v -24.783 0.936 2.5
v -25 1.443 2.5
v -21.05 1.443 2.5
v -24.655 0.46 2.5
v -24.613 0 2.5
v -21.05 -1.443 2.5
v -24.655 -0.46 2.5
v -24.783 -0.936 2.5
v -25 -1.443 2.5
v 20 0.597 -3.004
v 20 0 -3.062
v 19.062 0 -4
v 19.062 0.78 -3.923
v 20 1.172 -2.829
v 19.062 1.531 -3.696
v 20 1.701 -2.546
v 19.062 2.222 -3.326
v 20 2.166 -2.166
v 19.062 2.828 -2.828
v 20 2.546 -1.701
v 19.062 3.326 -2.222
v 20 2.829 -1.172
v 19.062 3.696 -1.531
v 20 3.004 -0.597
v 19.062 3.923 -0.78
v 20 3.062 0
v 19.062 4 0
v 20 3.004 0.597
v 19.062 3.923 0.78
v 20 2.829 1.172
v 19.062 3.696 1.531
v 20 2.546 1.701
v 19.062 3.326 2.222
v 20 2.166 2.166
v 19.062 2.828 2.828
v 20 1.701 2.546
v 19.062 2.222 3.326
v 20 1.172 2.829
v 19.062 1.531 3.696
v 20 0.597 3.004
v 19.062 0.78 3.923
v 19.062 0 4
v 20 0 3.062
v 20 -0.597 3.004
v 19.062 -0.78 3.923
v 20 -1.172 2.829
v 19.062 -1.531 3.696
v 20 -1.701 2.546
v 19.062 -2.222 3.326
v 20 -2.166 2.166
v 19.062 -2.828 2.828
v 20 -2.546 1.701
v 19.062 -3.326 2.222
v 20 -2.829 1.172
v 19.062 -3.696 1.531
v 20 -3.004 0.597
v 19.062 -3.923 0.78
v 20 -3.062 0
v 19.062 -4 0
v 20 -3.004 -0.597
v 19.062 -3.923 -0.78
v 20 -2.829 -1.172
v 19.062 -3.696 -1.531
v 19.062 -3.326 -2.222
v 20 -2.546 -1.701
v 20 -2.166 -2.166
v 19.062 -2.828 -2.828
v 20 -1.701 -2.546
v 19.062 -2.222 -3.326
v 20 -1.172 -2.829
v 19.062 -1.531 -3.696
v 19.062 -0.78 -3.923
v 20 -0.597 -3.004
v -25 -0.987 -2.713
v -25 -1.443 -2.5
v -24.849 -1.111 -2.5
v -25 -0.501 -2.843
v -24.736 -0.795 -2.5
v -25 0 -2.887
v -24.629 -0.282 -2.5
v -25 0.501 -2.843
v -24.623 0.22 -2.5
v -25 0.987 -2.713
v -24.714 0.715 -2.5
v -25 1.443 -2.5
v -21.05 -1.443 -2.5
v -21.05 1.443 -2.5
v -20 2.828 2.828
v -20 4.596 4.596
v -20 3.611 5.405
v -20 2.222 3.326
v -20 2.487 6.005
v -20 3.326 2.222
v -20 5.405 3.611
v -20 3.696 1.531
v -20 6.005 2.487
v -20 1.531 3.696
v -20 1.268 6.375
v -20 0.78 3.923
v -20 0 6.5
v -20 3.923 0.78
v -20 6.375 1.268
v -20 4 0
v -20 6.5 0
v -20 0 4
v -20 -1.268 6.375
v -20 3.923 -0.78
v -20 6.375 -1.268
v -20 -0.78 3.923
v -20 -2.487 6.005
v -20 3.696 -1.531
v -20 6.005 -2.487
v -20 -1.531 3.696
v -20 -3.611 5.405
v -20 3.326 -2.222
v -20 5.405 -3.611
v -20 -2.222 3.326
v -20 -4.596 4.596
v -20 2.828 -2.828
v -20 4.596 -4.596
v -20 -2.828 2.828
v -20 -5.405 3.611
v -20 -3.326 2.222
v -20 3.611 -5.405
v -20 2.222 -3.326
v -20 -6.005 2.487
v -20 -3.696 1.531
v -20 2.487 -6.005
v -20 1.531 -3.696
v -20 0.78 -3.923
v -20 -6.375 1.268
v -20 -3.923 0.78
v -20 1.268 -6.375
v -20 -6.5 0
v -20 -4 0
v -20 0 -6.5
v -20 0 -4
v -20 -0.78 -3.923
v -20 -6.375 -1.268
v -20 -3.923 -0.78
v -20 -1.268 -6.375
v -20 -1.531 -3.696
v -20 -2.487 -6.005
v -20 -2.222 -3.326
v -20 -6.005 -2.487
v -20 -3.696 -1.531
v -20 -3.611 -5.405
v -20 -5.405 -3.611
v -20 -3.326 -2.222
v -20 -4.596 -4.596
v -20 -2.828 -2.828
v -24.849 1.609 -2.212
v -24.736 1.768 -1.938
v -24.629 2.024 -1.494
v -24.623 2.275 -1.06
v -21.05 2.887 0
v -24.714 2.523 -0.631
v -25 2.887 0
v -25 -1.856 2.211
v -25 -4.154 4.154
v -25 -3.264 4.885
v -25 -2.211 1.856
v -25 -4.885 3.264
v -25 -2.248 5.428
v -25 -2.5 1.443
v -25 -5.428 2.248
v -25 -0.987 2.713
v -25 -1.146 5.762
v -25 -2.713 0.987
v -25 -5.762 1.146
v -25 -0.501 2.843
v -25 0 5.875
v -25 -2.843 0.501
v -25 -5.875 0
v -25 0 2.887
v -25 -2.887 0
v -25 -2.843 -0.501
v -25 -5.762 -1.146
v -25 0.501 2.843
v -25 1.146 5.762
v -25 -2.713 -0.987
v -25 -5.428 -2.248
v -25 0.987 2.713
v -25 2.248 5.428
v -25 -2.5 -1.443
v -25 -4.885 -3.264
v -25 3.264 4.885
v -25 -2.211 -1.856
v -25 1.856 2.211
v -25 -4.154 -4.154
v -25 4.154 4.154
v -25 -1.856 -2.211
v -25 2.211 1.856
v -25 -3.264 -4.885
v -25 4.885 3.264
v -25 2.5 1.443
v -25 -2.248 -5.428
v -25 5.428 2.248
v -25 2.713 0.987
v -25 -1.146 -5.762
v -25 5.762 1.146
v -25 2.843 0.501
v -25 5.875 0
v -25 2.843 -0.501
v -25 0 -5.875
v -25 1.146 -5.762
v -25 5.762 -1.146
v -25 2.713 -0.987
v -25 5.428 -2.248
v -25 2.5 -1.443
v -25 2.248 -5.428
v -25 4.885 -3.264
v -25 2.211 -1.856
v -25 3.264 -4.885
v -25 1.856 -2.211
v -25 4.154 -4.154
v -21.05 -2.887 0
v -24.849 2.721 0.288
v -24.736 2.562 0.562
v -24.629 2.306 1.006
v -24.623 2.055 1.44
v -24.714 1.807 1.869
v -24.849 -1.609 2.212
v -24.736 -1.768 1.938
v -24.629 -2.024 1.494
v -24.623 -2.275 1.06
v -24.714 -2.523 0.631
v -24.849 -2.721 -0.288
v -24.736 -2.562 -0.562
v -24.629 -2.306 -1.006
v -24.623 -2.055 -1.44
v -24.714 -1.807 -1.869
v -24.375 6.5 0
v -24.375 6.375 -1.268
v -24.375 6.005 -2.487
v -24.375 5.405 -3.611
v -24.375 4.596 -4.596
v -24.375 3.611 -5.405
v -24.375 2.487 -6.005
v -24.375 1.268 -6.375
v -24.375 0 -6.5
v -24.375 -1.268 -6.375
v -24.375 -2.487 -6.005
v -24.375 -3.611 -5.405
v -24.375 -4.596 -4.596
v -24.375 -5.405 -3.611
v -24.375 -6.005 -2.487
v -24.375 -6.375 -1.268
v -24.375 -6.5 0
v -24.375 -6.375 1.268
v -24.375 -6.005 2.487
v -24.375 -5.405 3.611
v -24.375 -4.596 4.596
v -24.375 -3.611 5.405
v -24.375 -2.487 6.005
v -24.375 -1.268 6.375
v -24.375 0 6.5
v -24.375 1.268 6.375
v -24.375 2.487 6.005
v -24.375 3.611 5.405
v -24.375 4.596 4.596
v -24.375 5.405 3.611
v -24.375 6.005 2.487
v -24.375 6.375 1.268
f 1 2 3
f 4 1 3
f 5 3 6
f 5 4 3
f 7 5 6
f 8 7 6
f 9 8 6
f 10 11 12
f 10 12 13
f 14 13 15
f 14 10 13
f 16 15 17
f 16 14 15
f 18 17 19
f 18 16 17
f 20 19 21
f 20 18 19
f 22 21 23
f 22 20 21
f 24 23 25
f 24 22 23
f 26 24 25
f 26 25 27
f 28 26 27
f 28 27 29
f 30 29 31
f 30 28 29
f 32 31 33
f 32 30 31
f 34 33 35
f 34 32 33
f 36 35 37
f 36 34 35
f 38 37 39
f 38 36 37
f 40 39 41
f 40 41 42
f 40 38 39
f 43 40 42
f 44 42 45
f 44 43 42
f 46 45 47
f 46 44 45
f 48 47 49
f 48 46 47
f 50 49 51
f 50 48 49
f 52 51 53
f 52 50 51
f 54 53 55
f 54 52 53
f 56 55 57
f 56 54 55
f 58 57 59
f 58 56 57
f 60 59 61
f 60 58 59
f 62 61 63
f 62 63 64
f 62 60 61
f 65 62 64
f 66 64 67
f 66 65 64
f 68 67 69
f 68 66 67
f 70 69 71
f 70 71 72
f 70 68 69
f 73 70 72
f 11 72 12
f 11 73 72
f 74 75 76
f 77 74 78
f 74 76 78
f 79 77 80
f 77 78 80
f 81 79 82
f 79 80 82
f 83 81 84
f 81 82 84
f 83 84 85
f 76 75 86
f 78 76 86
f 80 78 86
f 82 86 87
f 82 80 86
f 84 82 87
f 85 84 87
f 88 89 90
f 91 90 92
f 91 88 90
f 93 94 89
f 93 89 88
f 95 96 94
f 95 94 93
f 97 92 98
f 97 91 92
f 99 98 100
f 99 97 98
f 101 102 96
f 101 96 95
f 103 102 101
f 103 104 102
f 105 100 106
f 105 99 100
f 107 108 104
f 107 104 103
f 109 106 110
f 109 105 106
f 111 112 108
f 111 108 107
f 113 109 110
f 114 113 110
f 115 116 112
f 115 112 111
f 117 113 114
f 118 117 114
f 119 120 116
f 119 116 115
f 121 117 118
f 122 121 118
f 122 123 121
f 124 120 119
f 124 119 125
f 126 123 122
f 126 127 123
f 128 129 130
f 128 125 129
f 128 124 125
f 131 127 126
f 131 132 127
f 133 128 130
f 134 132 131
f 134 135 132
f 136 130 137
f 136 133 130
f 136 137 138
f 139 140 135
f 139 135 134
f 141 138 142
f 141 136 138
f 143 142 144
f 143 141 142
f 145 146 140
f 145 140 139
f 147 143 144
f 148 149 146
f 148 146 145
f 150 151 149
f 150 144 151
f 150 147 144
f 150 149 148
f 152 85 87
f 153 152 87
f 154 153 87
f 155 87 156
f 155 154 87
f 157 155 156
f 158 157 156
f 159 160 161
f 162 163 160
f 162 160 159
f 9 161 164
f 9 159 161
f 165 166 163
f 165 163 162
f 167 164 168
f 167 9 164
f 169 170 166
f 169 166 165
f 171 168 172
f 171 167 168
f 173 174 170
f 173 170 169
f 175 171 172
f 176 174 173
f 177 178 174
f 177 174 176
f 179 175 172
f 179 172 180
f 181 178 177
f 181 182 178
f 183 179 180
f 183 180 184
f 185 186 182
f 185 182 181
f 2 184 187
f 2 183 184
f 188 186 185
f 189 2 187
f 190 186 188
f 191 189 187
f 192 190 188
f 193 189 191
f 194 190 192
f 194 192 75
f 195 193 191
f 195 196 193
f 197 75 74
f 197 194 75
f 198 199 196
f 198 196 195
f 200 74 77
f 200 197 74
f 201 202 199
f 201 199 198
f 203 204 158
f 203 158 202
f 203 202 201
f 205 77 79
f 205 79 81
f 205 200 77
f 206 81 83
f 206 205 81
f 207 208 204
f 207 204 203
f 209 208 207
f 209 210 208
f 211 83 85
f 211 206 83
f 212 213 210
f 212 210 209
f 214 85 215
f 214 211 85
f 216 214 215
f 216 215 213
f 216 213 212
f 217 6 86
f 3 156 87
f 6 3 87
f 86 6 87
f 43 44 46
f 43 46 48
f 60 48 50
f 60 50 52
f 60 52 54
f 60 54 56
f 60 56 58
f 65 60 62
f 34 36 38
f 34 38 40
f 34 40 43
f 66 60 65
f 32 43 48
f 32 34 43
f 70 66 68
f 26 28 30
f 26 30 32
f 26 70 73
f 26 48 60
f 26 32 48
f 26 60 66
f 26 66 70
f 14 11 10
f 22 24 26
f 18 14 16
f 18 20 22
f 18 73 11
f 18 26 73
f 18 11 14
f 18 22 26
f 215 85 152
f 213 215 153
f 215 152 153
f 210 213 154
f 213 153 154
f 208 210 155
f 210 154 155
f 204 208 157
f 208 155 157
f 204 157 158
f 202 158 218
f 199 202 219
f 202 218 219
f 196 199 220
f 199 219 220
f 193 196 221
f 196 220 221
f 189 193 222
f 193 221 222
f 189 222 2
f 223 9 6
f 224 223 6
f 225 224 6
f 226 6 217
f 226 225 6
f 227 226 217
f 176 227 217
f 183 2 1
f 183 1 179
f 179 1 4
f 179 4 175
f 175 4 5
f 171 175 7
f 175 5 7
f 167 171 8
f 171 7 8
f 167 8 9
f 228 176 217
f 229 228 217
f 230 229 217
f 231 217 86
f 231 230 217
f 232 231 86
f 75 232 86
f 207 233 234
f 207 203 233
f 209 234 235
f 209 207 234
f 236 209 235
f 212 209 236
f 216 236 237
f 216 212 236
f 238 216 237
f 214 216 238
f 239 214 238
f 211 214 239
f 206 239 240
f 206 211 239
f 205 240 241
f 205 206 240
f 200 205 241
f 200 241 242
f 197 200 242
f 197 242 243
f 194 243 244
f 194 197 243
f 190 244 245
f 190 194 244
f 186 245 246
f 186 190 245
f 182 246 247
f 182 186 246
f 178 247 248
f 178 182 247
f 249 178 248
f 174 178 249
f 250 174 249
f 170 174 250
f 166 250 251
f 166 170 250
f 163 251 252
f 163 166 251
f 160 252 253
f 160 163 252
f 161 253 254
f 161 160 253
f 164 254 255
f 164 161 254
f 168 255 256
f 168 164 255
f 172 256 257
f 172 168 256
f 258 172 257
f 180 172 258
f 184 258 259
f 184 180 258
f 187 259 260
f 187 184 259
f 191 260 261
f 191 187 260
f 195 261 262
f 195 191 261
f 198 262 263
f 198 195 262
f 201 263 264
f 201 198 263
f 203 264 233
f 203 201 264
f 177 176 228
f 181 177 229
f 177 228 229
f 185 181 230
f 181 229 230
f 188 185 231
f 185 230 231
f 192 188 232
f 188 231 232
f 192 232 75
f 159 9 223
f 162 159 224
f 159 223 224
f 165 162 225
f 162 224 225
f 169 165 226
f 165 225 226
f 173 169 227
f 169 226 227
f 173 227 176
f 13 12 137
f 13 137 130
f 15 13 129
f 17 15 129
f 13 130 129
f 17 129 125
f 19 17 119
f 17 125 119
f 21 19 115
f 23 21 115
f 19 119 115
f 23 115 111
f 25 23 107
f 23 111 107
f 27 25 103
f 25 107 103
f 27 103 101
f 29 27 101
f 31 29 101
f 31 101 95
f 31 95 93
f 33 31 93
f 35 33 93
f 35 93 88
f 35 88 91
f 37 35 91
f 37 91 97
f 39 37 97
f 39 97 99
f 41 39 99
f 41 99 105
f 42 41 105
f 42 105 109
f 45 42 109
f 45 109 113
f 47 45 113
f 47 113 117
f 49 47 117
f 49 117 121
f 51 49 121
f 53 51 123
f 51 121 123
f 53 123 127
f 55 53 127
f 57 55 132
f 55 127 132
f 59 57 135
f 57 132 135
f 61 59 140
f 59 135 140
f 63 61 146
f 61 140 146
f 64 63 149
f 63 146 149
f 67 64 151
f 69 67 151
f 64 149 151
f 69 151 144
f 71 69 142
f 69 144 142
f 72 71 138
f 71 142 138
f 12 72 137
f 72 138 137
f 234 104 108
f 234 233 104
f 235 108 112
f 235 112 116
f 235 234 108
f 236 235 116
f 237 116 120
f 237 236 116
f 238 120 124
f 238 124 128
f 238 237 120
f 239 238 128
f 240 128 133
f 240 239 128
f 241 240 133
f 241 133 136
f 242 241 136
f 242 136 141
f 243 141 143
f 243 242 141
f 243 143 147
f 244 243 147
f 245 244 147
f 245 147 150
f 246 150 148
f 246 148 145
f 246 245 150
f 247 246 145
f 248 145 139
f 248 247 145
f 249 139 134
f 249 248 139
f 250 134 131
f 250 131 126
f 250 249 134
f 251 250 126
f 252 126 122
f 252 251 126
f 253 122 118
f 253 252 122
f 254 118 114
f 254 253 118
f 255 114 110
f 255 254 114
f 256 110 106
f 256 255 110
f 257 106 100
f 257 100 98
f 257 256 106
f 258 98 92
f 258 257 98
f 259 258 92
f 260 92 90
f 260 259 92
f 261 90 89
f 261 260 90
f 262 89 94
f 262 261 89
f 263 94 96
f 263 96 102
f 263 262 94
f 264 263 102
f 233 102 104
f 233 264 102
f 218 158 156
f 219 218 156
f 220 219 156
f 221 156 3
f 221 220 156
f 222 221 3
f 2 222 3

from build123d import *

# Parameters (mm, degrees)
SKETCH2_R           = 4
BOSS_EXTRUDE1_DEPTH = 22
CHAMFER1_SIZE       = 0.9375
CUT_EXTRUDE1_DEPTH  = 3.95


with BuildPart() as part:
    # Sketch2 → Boss-Extrude1 (new body)
    with BuildSketch(Plane(origin=(20, 0, 0), x_dir=(0, 0, -1), z_dir=(1, 0, 0))):
        Circle(SKETCH2_R)
    extrude(amount=-BOSS_EXTRUDE1_DEPTH)

    # Chamfer1
    chamfer1_edges = [part.edges().sort_by_distance(p)[0] for p in [
        (20, 0, 4),
    ]]
    chamfer(chamfer1_edges, length=CHAMFER1_SIZE)

    # Sketch10 → Revolve2 (revolve)
    with BuildSketch(Plane.XY, mode=Mode.PRIVATE) as revolve2_sk:
        Polygon((0.309401077, 0), (-2, 4), (-20, 4), (-20, 0), align=None)
    revolve(revolve2_sk.sketch.rotate(Axis((-20, 0, 0), (1, 0, 0)), 270), axis=Axis((-20, 0, 0), (1, 0, 0)))

    # Sketch6 → Revolve1 (revolve)
    with BuildSketch(Plane.XY):
        Polygon((-24.375, 6.5), (-25, 5.875), (-25, 0), (-20, 0), (-20, 6.5), align=None)
    revolve(axis=Axis((-20, 0, 0), (-1, 0, 0)))

    # Sketch4 → Cut-Extrude1 (cut)
    with BuildSketch(Plane(origin=(-25, 0, 0), x_dir=(0, 0, -1), z_dir=(1, 0, 0))):
        Polygon((0, 2.886751346), (-2.5, 1.443375673), (-2.5, -1.443375673), (0, -2.886751346), (2.5, -1.443375673), (2.5, 1.443375673), align=None)
    extrude(amount=CUT_EXTRUDE1_DEPTH, mode=Mode.SUBTRACT)

    # Cut-Extrude2 cone 1 section (through the dimple's axis) → Cut-Extrude2 (revolve, cut)
    with BuildSketch(Plane(origin=(-25, 0, 0), x_dir=(0, 0, 1), z_dir=(0, 1, 0))):
        Polygon((0, 0), (2.886751346, 0), (0, 2.886751346), align=None)
    revolve(axis=Axis((-25, 0, 0), (1, 0, 0)), mode=Mode.SUBTRACT)


solid = part.part
